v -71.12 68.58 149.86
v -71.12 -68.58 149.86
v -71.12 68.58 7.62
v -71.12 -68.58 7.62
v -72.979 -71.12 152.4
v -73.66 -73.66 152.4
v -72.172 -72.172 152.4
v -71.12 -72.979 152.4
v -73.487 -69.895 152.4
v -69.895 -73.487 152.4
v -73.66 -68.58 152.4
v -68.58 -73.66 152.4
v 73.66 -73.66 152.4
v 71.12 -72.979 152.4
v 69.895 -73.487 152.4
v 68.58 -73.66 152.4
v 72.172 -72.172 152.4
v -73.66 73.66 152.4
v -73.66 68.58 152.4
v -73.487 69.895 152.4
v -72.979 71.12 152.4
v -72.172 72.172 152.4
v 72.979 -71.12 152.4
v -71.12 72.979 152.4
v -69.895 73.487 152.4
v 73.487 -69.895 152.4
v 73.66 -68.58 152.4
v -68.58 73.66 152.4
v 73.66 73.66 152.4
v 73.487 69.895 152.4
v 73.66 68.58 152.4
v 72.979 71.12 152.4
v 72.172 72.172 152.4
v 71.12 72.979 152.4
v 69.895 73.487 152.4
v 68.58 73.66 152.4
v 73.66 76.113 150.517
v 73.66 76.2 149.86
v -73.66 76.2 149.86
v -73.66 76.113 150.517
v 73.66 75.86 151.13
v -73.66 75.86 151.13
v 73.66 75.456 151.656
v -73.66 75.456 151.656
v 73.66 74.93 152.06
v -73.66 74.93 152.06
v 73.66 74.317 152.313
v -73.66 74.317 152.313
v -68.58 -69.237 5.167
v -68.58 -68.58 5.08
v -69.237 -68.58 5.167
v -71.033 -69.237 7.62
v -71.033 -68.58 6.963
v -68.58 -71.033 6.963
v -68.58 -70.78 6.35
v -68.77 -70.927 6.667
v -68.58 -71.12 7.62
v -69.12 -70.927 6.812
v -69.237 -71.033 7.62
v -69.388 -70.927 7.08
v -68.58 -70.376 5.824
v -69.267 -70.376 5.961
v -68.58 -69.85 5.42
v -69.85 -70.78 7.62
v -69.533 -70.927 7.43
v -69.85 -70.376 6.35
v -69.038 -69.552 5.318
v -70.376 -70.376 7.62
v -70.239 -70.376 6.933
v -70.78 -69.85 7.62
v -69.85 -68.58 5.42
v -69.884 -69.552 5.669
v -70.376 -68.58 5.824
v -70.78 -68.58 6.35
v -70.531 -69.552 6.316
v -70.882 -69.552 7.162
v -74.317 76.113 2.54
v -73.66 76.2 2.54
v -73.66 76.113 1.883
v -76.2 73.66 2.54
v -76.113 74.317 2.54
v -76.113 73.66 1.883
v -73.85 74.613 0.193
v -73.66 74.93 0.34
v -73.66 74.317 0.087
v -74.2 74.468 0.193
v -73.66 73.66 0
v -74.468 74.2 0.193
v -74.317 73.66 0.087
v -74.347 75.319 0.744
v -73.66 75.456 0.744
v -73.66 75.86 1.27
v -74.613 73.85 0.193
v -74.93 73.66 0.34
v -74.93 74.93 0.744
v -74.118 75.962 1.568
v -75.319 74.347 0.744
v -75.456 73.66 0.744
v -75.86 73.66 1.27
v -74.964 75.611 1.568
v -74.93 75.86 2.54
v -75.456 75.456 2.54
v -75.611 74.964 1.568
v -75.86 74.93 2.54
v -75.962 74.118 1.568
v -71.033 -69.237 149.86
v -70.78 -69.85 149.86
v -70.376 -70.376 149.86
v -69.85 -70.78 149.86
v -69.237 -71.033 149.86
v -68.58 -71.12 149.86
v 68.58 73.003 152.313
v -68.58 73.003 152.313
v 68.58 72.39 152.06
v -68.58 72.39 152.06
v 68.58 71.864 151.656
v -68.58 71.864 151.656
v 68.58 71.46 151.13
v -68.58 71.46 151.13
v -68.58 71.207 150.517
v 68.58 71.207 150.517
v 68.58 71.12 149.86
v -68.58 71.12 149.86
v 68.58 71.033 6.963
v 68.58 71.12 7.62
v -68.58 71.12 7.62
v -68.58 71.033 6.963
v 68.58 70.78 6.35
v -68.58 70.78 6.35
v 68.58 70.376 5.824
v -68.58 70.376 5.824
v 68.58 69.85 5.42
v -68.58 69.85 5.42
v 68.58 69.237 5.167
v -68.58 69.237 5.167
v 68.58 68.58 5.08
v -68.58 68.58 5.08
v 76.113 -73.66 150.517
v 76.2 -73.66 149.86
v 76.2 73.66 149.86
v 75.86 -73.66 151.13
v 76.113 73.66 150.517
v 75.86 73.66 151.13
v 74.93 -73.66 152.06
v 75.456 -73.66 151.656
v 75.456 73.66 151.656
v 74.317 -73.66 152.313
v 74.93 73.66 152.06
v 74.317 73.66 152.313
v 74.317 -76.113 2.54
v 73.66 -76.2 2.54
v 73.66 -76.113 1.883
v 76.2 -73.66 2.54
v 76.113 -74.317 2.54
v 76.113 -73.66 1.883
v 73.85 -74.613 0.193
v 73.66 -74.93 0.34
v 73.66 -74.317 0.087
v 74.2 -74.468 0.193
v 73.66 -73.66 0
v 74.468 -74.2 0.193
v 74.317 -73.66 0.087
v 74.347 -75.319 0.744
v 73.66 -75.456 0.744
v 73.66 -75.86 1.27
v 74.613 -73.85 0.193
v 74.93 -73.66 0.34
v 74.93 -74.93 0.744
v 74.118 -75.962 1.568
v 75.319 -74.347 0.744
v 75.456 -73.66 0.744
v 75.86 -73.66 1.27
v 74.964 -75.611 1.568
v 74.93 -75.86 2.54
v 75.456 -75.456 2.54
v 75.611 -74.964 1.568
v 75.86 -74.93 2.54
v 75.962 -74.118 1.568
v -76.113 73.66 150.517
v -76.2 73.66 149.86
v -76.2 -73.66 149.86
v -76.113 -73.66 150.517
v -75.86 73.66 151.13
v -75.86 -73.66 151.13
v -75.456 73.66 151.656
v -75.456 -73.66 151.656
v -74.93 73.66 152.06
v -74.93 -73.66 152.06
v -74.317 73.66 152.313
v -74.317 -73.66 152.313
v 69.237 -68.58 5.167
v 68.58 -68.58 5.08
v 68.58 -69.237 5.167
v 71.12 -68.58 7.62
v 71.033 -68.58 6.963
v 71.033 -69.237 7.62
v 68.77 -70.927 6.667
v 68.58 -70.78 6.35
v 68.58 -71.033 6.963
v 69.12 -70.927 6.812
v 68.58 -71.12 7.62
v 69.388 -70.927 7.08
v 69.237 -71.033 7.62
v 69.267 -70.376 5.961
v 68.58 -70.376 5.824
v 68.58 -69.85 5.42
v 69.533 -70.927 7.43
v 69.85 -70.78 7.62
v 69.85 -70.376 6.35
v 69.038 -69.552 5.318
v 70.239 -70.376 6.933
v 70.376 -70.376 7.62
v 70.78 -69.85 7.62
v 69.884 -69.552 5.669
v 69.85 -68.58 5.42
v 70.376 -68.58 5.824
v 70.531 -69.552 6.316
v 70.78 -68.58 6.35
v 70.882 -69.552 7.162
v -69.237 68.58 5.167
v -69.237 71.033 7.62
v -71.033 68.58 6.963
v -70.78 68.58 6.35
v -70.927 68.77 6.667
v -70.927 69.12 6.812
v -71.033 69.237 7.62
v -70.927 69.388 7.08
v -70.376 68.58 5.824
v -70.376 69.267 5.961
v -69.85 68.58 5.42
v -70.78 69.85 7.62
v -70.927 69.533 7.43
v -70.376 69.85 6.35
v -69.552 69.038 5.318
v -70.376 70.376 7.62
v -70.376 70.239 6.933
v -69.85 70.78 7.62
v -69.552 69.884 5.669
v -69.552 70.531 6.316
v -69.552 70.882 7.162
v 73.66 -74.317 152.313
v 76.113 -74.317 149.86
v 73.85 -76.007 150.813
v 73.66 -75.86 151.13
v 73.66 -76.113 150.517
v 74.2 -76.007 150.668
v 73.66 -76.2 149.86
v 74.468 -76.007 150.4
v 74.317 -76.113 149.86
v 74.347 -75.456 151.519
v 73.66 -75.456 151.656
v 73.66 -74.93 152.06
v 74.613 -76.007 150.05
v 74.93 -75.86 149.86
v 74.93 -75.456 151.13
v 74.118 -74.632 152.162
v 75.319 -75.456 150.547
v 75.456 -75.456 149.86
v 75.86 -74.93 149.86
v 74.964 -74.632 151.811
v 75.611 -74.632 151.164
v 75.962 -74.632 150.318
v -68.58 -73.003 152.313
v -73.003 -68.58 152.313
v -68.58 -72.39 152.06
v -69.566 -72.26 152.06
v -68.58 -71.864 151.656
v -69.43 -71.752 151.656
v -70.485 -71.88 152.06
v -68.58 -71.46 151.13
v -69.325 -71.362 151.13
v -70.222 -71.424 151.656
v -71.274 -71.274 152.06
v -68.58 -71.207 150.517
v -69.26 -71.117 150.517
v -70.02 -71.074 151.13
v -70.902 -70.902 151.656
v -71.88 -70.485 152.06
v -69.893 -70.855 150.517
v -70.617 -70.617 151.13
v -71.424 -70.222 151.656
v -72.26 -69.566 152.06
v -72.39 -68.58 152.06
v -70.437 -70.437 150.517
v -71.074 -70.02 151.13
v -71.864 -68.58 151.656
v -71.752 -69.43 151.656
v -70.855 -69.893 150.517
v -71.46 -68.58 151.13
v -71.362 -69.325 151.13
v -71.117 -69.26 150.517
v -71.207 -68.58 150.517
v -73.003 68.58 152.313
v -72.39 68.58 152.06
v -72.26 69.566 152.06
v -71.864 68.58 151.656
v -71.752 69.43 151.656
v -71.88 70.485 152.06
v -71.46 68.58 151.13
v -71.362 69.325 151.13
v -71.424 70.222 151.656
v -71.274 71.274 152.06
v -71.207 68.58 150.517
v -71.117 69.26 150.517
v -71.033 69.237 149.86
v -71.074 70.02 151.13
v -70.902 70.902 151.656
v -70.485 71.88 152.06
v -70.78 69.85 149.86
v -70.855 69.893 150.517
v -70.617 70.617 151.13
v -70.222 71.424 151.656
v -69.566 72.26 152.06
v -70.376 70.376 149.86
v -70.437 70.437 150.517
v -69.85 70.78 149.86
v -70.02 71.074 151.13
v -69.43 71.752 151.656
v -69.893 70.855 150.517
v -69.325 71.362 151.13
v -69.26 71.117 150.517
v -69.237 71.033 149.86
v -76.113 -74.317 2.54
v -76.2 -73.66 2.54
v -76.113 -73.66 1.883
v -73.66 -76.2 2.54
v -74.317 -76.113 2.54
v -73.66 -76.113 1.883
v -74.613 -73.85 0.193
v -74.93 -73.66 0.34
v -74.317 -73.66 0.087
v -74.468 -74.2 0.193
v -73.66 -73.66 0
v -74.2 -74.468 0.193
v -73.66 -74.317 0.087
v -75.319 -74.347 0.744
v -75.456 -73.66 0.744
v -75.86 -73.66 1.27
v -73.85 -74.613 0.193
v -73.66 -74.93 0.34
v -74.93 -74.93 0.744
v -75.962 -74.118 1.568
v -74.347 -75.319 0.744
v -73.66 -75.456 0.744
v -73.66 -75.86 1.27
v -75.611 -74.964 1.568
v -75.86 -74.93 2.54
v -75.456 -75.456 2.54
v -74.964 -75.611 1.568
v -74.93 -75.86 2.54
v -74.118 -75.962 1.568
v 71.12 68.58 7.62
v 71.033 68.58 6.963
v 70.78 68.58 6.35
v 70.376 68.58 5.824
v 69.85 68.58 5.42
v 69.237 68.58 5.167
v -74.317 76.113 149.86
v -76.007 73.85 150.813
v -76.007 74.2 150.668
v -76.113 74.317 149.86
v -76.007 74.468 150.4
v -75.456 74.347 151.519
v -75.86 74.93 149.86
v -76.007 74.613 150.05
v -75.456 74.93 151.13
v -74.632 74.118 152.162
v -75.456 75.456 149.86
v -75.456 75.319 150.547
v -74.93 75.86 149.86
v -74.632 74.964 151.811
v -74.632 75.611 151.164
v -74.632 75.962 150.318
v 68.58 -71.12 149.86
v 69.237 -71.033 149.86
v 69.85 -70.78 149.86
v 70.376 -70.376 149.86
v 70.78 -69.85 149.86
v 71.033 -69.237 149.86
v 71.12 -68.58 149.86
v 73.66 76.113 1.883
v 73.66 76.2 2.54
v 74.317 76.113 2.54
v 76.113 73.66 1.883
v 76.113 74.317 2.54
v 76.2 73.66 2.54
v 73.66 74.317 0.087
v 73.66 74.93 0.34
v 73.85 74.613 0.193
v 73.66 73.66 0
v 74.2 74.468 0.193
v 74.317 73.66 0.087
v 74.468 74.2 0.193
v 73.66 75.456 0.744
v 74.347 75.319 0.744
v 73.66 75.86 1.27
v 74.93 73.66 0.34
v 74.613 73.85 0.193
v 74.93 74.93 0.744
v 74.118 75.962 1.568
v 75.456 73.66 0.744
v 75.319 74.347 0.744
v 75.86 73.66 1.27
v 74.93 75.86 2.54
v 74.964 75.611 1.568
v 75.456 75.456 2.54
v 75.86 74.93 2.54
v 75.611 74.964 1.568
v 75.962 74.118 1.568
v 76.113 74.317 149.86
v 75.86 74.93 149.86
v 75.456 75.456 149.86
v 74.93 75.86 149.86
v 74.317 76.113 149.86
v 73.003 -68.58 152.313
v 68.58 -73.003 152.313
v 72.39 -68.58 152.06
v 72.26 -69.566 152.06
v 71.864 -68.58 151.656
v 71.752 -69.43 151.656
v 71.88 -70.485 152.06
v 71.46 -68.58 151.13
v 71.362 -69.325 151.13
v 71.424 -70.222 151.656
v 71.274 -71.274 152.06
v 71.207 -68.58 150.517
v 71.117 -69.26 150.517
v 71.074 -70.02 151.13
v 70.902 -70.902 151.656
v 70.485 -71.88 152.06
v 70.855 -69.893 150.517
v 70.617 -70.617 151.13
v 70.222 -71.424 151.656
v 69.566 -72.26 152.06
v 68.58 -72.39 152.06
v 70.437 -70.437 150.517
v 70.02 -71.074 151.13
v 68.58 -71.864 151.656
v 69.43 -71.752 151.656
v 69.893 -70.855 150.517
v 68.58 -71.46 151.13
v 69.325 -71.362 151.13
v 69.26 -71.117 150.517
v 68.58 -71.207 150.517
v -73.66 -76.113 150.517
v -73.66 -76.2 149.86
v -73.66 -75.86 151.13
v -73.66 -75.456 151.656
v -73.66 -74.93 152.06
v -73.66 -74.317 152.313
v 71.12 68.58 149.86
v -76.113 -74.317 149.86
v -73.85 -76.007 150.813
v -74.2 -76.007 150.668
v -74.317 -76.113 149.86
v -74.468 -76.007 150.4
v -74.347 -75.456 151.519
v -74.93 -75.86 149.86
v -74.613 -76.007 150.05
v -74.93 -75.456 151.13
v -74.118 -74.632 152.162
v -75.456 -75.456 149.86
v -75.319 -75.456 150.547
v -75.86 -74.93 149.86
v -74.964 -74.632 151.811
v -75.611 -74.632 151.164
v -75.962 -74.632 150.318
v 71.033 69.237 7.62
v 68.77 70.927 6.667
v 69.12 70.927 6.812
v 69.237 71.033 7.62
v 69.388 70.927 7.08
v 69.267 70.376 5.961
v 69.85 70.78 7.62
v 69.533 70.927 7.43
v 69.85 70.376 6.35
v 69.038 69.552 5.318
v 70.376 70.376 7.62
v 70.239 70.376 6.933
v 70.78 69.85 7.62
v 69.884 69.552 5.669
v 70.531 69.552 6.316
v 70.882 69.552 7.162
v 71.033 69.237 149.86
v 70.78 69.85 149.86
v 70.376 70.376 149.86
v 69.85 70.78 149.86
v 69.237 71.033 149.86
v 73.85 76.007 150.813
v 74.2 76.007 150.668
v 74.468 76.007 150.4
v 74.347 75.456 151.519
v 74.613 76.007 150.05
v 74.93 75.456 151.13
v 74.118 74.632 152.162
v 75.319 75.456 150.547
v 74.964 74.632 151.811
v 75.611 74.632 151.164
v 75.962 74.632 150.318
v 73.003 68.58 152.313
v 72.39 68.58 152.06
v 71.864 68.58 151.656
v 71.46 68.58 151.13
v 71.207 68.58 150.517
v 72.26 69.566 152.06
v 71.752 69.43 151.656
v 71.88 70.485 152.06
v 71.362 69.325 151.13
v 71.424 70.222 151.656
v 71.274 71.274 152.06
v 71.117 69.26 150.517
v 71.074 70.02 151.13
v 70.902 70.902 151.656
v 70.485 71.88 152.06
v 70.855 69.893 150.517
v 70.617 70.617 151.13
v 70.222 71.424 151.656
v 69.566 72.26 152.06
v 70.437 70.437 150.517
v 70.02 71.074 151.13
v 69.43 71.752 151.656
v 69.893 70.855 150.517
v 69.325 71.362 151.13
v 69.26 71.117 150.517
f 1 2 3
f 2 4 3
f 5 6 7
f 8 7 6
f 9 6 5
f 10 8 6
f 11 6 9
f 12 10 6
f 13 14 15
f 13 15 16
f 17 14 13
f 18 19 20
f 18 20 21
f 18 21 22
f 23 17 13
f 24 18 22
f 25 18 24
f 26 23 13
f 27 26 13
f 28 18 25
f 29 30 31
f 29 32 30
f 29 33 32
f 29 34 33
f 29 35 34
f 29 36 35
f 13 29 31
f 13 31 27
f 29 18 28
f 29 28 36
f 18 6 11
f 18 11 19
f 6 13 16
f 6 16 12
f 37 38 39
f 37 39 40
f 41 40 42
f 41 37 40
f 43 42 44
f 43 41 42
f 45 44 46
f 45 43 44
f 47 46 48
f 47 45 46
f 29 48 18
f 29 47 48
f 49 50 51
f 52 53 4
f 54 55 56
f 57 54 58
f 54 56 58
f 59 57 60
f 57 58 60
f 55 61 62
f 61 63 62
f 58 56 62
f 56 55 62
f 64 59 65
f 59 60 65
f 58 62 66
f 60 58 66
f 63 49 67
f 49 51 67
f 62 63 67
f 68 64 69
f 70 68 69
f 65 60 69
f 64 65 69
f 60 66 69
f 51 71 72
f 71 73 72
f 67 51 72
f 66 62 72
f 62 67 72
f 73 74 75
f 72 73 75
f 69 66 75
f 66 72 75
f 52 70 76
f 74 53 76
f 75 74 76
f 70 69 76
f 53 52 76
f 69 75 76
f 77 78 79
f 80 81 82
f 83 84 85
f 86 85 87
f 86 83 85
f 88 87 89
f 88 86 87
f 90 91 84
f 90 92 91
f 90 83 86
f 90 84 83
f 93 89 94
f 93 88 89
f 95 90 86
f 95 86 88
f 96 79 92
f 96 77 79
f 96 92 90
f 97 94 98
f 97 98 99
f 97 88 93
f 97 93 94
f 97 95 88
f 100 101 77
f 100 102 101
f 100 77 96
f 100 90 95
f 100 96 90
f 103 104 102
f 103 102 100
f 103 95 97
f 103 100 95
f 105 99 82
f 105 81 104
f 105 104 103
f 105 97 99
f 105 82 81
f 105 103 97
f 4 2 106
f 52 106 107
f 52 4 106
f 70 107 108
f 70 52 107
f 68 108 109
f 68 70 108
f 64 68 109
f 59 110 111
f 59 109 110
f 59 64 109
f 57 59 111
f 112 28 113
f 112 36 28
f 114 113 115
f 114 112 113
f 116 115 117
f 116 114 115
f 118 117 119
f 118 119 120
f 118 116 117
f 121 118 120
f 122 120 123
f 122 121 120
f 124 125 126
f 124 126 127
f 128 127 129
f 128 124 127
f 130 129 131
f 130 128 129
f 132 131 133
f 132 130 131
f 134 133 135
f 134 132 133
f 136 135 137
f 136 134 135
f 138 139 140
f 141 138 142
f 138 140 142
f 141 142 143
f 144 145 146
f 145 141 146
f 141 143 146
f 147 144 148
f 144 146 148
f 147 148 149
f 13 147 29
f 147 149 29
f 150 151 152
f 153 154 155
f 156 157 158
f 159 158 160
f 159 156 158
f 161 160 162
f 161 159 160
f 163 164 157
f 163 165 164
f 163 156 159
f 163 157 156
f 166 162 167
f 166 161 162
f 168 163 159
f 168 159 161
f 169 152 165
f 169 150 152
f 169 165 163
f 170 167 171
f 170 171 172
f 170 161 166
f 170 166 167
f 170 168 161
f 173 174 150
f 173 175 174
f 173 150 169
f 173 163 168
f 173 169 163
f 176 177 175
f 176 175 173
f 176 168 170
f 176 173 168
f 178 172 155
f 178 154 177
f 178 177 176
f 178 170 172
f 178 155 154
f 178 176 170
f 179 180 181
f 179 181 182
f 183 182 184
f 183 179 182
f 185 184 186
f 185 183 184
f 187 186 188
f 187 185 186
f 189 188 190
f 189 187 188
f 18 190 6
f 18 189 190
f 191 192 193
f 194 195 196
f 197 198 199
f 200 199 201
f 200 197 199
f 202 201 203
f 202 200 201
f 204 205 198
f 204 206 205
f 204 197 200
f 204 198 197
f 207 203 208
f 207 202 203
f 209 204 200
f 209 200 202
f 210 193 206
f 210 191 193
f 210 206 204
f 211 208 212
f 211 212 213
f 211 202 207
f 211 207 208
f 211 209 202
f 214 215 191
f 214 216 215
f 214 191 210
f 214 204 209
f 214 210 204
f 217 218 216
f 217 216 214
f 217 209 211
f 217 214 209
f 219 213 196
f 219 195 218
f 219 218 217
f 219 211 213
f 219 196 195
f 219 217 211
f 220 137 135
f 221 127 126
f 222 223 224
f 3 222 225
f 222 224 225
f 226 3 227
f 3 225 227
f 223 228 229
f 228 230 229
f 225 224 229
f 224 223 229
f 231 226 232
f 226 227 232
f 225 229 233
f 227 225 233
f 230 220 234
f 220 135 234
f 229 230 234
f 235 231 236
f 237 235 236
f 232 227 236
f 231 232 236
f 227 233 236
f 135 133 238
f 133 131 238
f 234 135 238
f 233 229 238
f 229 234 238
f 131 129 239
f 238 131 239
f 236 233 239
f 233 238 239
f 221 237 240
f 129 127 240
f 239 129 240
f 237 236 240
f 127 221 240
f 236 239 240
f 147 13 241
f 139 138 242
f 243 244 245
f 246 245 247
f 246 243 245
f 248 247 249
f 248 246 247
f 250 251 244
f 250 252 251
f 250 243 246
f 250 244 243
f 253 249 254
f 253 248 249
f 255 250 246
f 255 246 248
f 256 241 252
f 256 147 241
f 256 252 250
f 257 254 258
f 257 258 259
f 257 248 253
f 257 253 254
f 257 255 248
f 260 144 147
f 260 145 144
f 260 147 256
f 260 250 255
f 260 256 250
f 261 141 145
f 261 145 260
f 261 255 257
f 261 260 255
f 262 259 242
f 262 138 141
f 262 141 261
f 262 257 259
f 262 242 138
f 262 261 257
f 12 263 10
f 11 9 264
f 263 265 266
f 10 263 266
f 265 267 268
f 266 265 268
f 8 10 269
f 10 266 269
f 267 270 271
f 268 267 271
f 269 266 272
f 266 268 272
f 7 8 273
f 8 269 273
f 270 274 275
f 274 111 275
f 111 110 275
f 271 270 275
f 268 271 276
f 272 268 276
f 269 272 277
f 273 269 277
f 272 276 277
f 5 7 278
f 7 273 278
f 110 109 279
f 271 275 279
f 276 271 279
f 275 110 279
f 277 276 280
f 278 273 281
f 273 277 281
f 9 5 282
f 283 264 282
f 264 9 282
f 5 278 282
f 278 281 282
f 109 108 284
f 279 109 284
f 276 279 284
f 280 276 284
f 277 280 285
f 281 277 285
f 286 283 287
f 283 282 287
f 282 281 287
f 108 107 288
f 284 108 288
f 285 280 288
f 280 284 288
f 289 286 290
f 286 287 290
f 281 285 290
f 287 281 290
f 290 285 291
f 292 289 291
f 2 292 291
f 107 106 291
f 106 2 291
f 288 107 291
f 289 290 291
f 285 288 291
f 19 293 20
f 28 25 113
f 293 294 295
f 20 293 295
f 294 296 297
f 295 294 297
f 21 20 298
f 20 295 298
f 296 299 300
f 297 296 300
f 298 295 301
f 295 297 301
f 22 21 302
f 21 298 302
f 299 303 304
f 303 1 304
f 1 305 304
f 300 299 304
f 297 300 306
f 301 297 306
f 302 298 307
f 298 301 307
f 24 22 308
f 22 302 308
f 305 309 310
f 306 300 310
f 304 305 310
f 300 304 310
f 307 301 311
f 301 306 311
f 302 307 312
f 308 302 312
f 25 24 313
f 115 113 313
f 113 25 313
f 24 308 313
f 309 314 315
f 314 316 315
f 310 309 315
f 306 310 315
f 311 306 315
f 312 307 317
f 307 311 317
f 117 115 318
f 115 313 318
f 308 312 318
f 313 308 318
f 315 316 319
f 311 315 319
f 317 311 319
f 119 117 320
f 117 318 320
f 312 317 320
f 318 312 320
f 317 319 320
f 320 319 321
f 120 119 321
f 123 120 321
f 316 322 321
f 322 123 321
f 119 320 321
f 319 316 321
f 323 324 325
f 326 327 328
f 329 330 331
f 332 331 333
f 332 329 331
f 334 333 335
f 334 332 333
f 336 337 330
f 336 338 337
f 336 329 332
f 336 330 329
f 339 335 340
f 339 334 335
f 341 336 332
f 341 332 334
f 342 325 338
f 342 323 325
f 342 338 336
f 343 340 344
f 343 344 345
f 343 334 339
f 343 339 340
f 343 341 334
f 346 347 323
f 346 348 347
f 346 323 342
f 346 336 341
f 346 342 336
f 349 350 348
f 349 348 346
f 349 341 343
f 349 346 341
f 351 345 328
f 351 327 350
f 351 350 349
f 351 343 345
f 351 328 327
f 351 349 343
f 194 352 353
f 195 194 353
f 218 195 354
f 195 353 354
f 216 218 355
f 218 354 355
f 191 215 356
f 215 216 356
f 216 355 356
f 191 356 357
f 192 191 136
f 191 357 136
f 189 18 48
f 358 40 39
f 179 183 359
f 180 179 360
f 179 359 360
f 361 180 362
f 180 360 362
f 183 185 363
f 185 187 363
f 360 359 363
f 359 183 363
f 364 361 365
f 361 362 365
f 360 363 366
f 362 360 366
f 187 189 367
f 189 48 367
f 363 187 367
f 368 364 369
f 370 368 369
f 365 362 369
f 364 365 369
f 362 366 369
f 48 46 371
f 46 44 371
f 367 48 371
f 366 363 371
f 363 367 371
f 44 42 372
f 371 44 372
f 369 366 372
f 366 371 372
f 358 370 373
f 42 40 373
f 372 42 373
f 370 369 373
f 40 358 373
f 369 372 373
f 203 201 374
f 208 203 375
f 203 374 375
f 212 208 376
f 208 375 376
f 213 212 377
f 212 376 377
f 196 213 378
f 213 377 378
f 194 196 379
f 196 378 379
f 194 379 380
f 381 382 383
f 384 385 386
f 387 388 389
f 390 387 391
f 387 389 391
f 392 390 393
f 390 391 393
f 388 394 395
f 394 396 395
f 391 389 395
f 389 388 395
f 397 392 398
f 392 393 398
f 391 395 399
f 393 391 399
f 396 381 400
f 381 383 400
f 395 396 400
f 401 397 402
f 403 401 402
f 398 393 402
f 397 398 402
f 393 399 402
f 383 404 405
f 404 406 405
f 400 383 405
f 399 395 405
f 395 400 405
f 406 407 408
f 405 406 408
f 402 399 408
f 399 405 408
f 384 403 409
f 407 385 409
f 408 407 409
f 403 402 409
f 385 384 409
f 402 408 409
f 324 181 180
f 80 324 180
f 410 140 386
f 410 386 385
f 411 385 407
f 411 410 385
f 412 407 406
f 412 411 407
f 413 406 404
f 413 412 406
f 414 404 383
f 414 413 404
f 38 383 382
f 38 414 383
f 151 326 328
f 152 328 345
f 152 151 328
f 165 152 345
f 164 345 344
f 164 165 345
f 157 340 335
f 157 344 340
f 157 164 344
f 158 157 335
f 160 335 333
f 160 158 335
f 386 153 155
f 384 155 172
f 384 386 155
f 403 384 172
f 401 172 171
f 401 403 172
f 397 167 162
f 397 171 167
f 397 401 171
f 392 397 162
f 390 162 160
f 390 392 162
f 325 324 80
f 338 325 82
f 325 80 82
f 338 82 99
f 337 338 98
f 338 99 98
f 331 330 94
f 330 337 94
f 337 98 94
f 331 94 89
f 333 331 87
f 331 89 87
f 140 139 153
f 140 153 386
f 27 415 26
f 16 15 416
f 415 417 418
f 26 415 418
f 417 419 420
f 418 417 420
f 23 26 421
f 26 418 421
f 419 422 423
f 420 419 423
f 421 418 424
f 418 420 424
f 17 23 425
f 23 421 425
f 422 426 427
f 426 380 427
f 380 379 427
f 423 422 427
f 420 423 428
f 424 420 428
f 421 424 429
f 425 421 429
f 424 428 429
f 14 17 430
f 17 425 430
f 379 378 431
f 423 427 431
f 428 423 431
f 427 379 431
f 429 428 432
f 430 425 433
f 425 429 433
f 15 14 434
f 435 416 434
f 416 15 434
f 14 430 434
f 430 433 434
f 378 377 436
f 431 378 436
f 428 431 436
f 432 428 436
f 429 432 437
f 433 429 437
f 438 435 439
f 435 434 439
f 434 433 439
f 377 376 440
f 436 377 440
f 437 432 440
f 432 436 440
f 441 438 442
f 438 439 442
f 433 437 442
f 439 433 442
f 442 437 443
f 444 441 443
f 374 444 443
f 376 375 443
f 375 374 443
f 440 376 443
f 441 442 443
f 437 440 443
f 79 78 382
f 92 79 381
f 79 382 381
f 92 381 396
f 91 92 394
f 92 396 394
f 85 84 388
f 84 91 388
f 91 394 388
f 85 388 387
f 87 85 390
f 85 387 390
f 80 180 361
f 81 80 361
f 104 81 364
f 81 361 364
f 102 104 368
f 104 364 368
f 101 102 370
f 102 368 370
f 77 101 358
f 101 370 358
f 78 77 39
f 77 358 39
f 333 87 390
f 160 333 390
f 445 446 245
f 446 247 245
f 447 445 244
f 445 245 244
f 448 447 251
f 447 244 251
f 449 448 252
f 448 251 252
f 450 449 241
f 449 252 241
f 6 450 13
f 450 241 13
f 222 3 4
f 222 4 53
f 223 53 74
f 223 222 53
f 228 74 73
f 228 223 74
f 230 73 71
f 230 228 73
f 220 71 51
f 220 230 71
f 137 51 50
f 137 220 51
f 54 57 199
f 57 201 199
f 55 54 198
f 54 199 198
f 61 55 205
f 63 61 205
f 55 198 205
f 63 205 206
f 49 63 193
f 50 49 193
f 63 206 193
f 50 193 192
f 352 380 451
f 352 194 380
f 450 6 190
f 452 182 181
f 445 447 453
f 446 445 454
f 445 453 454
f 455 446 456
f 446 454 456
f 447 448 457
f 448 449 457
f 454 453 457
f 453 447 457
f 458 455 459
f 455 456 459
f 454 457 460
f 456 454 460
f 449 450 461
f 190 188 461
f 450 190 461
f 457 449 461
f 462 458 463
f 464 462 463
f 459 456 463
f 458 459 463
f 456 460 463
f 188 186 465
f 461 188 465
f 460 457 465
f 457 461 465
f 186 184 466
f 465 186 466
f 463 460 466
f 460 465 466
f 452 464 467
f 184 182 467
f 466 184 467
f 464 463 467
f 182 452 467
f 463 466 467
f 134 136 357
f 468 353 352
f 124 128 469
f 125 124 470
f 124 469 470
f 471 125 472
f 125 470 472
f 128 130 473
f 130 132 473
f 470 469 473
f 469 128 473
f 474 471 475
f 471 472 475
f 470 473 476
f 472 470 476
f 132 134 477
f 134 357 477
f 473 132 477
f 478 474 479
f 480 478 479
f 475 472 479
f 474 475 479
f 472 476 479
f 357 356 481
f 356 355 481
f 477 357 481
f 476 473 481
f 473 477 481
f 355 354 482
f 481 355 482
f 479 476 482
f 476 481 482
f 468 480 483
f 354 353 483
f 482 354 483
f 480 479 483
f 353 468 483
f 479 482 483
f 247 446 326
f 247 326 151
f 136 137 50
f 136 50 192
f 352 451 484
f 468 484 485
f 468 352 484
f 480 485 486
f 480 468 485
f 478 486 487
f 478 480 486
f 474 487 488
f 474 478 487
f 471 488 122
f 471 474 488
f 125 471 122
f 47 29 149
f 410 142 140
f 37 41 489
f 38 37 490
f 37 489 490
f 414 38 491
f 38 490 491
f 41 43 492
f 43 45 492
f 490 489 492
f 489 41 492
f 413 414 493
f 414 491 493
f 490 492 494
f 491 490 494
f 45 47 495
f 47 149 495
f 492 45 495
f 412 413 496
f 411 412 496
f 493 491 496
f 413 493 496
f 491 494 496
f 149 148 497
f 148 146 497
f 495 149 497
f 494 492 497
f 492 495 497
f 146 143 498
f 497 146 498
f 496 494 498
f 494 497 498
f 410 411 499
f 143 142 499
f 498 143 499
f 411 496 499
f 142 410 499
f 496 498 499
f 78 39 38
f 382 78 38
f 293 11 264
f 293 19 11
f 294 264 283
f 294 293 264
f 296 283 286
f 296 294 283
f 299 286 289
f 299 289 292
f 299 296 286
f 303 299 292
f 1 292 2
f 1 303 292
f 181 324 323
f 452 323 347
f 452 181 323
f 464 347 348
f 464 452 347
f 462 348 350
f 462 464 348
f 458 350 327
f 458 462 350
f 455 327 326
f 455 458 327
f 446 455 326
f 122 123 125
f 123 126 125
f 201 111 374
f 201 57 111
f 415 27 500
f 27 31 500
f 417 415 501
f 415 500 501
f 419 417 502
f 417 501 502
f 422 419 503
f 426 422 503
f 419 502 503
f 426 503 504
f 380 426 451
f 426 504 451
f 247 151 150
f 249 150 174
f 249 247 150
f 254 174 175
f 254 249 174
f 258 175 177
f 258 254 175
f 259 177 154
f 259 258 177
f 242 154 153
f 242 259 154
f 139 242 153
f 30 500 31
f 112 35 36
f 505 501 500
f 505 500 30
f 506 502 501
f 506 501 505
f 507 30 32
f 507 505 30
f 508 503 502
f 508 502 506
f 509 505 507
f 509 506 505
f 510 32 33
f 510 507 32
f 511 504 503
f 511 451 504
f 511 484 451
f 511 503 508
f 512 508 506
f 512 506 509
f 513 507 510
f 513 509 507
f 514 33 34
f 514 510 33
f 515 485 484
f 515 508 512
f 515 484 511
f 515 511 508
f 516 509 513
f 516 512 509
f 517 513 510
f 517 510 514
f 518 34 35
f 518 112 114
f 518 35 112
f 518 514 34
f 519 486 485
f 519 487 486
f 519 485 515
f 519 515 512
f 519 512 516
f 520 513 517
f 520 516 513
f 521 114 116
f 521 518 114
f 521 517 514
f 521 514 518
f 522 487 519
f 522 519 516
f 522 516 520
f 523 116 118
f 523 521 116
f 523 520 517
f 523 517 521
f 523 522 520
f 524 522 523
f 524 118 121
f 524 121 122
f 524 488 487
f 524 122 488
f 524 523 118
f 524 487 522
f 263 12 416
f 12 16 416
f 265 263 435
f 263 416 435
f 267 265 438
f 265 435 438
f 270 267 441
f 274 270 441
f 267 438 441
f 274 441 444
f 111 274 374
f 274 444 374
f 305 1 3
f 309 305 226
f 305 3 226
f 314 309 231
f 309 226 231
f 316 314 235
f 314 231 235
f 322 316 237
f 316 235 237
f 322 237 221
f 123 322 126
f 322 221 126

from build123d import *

# Parameters (mm, degrees)
F0_W     = 152.4
F0_H     = 152.4
F1_DEPTH = 152.4
F2_T     = -5.08
F3_R     = 2.53999


# Not quite as in the source:
# - a fillet or chamfer is up to 0.001 mm smaller than in the source, because OpenCascade refuses the exact size


with BuildPart() as f1:
    # F0 (on Top) → F1 (new body)
    with BuildSketch(Plane.XY):
        Rectangle(F0_W, F0_H)
    extrude(amount=F1_DEPTH)

    # F2
    f2_openings = [f1.faces().sort_by_distance(p)[0] for p in [
        (0, 0, 152.4),
    ]]
    offset(amount=F2_T, openings=f2_openings)

    # F3 (radius 2.54 in the source; OpenCascade refuses exactly that, so slightly less here)
    f3_edges = [f1.edges().sort_by_distance(p)[0] for p in [
        (76.2, 0, 152.4),
        (0, 76.2, 152.4),
        (-76.2, 0, 152.4),
        (0, -76.2, 152.4),
        (71.12, 0, 152.4),
        (0, -71.12, 152.4),
        (-71.12, 0, 152.4),
        (0, 71.12, 152.4),
        (76.2, 76.2, 76.2),
        (-76.2, 76.2, 76.2),
        (0, 76.2, 0),
        (71.12, 0, 5.08),
        (0, 71.12, 5.08),
        (-71.12, 0, 5.08),
        (0, -71.12, 5.08),
        (-71.12, -71.12, 78.74),
        (-71.12, 71.12, 78.74),
        (71.12, -71.12, 78.74),
        (71.12, 71.12, 78.74),
        (-76.2, -76.2, 76.2),
        (-76.2, 0, 0),
        (76.2, -76.2, 76.2),
        (0, -76.2, 0),
        (76.2, 0, 0),
    ]]
    fillet(f3_edges, radius=F3_R)


solid = f1.part
